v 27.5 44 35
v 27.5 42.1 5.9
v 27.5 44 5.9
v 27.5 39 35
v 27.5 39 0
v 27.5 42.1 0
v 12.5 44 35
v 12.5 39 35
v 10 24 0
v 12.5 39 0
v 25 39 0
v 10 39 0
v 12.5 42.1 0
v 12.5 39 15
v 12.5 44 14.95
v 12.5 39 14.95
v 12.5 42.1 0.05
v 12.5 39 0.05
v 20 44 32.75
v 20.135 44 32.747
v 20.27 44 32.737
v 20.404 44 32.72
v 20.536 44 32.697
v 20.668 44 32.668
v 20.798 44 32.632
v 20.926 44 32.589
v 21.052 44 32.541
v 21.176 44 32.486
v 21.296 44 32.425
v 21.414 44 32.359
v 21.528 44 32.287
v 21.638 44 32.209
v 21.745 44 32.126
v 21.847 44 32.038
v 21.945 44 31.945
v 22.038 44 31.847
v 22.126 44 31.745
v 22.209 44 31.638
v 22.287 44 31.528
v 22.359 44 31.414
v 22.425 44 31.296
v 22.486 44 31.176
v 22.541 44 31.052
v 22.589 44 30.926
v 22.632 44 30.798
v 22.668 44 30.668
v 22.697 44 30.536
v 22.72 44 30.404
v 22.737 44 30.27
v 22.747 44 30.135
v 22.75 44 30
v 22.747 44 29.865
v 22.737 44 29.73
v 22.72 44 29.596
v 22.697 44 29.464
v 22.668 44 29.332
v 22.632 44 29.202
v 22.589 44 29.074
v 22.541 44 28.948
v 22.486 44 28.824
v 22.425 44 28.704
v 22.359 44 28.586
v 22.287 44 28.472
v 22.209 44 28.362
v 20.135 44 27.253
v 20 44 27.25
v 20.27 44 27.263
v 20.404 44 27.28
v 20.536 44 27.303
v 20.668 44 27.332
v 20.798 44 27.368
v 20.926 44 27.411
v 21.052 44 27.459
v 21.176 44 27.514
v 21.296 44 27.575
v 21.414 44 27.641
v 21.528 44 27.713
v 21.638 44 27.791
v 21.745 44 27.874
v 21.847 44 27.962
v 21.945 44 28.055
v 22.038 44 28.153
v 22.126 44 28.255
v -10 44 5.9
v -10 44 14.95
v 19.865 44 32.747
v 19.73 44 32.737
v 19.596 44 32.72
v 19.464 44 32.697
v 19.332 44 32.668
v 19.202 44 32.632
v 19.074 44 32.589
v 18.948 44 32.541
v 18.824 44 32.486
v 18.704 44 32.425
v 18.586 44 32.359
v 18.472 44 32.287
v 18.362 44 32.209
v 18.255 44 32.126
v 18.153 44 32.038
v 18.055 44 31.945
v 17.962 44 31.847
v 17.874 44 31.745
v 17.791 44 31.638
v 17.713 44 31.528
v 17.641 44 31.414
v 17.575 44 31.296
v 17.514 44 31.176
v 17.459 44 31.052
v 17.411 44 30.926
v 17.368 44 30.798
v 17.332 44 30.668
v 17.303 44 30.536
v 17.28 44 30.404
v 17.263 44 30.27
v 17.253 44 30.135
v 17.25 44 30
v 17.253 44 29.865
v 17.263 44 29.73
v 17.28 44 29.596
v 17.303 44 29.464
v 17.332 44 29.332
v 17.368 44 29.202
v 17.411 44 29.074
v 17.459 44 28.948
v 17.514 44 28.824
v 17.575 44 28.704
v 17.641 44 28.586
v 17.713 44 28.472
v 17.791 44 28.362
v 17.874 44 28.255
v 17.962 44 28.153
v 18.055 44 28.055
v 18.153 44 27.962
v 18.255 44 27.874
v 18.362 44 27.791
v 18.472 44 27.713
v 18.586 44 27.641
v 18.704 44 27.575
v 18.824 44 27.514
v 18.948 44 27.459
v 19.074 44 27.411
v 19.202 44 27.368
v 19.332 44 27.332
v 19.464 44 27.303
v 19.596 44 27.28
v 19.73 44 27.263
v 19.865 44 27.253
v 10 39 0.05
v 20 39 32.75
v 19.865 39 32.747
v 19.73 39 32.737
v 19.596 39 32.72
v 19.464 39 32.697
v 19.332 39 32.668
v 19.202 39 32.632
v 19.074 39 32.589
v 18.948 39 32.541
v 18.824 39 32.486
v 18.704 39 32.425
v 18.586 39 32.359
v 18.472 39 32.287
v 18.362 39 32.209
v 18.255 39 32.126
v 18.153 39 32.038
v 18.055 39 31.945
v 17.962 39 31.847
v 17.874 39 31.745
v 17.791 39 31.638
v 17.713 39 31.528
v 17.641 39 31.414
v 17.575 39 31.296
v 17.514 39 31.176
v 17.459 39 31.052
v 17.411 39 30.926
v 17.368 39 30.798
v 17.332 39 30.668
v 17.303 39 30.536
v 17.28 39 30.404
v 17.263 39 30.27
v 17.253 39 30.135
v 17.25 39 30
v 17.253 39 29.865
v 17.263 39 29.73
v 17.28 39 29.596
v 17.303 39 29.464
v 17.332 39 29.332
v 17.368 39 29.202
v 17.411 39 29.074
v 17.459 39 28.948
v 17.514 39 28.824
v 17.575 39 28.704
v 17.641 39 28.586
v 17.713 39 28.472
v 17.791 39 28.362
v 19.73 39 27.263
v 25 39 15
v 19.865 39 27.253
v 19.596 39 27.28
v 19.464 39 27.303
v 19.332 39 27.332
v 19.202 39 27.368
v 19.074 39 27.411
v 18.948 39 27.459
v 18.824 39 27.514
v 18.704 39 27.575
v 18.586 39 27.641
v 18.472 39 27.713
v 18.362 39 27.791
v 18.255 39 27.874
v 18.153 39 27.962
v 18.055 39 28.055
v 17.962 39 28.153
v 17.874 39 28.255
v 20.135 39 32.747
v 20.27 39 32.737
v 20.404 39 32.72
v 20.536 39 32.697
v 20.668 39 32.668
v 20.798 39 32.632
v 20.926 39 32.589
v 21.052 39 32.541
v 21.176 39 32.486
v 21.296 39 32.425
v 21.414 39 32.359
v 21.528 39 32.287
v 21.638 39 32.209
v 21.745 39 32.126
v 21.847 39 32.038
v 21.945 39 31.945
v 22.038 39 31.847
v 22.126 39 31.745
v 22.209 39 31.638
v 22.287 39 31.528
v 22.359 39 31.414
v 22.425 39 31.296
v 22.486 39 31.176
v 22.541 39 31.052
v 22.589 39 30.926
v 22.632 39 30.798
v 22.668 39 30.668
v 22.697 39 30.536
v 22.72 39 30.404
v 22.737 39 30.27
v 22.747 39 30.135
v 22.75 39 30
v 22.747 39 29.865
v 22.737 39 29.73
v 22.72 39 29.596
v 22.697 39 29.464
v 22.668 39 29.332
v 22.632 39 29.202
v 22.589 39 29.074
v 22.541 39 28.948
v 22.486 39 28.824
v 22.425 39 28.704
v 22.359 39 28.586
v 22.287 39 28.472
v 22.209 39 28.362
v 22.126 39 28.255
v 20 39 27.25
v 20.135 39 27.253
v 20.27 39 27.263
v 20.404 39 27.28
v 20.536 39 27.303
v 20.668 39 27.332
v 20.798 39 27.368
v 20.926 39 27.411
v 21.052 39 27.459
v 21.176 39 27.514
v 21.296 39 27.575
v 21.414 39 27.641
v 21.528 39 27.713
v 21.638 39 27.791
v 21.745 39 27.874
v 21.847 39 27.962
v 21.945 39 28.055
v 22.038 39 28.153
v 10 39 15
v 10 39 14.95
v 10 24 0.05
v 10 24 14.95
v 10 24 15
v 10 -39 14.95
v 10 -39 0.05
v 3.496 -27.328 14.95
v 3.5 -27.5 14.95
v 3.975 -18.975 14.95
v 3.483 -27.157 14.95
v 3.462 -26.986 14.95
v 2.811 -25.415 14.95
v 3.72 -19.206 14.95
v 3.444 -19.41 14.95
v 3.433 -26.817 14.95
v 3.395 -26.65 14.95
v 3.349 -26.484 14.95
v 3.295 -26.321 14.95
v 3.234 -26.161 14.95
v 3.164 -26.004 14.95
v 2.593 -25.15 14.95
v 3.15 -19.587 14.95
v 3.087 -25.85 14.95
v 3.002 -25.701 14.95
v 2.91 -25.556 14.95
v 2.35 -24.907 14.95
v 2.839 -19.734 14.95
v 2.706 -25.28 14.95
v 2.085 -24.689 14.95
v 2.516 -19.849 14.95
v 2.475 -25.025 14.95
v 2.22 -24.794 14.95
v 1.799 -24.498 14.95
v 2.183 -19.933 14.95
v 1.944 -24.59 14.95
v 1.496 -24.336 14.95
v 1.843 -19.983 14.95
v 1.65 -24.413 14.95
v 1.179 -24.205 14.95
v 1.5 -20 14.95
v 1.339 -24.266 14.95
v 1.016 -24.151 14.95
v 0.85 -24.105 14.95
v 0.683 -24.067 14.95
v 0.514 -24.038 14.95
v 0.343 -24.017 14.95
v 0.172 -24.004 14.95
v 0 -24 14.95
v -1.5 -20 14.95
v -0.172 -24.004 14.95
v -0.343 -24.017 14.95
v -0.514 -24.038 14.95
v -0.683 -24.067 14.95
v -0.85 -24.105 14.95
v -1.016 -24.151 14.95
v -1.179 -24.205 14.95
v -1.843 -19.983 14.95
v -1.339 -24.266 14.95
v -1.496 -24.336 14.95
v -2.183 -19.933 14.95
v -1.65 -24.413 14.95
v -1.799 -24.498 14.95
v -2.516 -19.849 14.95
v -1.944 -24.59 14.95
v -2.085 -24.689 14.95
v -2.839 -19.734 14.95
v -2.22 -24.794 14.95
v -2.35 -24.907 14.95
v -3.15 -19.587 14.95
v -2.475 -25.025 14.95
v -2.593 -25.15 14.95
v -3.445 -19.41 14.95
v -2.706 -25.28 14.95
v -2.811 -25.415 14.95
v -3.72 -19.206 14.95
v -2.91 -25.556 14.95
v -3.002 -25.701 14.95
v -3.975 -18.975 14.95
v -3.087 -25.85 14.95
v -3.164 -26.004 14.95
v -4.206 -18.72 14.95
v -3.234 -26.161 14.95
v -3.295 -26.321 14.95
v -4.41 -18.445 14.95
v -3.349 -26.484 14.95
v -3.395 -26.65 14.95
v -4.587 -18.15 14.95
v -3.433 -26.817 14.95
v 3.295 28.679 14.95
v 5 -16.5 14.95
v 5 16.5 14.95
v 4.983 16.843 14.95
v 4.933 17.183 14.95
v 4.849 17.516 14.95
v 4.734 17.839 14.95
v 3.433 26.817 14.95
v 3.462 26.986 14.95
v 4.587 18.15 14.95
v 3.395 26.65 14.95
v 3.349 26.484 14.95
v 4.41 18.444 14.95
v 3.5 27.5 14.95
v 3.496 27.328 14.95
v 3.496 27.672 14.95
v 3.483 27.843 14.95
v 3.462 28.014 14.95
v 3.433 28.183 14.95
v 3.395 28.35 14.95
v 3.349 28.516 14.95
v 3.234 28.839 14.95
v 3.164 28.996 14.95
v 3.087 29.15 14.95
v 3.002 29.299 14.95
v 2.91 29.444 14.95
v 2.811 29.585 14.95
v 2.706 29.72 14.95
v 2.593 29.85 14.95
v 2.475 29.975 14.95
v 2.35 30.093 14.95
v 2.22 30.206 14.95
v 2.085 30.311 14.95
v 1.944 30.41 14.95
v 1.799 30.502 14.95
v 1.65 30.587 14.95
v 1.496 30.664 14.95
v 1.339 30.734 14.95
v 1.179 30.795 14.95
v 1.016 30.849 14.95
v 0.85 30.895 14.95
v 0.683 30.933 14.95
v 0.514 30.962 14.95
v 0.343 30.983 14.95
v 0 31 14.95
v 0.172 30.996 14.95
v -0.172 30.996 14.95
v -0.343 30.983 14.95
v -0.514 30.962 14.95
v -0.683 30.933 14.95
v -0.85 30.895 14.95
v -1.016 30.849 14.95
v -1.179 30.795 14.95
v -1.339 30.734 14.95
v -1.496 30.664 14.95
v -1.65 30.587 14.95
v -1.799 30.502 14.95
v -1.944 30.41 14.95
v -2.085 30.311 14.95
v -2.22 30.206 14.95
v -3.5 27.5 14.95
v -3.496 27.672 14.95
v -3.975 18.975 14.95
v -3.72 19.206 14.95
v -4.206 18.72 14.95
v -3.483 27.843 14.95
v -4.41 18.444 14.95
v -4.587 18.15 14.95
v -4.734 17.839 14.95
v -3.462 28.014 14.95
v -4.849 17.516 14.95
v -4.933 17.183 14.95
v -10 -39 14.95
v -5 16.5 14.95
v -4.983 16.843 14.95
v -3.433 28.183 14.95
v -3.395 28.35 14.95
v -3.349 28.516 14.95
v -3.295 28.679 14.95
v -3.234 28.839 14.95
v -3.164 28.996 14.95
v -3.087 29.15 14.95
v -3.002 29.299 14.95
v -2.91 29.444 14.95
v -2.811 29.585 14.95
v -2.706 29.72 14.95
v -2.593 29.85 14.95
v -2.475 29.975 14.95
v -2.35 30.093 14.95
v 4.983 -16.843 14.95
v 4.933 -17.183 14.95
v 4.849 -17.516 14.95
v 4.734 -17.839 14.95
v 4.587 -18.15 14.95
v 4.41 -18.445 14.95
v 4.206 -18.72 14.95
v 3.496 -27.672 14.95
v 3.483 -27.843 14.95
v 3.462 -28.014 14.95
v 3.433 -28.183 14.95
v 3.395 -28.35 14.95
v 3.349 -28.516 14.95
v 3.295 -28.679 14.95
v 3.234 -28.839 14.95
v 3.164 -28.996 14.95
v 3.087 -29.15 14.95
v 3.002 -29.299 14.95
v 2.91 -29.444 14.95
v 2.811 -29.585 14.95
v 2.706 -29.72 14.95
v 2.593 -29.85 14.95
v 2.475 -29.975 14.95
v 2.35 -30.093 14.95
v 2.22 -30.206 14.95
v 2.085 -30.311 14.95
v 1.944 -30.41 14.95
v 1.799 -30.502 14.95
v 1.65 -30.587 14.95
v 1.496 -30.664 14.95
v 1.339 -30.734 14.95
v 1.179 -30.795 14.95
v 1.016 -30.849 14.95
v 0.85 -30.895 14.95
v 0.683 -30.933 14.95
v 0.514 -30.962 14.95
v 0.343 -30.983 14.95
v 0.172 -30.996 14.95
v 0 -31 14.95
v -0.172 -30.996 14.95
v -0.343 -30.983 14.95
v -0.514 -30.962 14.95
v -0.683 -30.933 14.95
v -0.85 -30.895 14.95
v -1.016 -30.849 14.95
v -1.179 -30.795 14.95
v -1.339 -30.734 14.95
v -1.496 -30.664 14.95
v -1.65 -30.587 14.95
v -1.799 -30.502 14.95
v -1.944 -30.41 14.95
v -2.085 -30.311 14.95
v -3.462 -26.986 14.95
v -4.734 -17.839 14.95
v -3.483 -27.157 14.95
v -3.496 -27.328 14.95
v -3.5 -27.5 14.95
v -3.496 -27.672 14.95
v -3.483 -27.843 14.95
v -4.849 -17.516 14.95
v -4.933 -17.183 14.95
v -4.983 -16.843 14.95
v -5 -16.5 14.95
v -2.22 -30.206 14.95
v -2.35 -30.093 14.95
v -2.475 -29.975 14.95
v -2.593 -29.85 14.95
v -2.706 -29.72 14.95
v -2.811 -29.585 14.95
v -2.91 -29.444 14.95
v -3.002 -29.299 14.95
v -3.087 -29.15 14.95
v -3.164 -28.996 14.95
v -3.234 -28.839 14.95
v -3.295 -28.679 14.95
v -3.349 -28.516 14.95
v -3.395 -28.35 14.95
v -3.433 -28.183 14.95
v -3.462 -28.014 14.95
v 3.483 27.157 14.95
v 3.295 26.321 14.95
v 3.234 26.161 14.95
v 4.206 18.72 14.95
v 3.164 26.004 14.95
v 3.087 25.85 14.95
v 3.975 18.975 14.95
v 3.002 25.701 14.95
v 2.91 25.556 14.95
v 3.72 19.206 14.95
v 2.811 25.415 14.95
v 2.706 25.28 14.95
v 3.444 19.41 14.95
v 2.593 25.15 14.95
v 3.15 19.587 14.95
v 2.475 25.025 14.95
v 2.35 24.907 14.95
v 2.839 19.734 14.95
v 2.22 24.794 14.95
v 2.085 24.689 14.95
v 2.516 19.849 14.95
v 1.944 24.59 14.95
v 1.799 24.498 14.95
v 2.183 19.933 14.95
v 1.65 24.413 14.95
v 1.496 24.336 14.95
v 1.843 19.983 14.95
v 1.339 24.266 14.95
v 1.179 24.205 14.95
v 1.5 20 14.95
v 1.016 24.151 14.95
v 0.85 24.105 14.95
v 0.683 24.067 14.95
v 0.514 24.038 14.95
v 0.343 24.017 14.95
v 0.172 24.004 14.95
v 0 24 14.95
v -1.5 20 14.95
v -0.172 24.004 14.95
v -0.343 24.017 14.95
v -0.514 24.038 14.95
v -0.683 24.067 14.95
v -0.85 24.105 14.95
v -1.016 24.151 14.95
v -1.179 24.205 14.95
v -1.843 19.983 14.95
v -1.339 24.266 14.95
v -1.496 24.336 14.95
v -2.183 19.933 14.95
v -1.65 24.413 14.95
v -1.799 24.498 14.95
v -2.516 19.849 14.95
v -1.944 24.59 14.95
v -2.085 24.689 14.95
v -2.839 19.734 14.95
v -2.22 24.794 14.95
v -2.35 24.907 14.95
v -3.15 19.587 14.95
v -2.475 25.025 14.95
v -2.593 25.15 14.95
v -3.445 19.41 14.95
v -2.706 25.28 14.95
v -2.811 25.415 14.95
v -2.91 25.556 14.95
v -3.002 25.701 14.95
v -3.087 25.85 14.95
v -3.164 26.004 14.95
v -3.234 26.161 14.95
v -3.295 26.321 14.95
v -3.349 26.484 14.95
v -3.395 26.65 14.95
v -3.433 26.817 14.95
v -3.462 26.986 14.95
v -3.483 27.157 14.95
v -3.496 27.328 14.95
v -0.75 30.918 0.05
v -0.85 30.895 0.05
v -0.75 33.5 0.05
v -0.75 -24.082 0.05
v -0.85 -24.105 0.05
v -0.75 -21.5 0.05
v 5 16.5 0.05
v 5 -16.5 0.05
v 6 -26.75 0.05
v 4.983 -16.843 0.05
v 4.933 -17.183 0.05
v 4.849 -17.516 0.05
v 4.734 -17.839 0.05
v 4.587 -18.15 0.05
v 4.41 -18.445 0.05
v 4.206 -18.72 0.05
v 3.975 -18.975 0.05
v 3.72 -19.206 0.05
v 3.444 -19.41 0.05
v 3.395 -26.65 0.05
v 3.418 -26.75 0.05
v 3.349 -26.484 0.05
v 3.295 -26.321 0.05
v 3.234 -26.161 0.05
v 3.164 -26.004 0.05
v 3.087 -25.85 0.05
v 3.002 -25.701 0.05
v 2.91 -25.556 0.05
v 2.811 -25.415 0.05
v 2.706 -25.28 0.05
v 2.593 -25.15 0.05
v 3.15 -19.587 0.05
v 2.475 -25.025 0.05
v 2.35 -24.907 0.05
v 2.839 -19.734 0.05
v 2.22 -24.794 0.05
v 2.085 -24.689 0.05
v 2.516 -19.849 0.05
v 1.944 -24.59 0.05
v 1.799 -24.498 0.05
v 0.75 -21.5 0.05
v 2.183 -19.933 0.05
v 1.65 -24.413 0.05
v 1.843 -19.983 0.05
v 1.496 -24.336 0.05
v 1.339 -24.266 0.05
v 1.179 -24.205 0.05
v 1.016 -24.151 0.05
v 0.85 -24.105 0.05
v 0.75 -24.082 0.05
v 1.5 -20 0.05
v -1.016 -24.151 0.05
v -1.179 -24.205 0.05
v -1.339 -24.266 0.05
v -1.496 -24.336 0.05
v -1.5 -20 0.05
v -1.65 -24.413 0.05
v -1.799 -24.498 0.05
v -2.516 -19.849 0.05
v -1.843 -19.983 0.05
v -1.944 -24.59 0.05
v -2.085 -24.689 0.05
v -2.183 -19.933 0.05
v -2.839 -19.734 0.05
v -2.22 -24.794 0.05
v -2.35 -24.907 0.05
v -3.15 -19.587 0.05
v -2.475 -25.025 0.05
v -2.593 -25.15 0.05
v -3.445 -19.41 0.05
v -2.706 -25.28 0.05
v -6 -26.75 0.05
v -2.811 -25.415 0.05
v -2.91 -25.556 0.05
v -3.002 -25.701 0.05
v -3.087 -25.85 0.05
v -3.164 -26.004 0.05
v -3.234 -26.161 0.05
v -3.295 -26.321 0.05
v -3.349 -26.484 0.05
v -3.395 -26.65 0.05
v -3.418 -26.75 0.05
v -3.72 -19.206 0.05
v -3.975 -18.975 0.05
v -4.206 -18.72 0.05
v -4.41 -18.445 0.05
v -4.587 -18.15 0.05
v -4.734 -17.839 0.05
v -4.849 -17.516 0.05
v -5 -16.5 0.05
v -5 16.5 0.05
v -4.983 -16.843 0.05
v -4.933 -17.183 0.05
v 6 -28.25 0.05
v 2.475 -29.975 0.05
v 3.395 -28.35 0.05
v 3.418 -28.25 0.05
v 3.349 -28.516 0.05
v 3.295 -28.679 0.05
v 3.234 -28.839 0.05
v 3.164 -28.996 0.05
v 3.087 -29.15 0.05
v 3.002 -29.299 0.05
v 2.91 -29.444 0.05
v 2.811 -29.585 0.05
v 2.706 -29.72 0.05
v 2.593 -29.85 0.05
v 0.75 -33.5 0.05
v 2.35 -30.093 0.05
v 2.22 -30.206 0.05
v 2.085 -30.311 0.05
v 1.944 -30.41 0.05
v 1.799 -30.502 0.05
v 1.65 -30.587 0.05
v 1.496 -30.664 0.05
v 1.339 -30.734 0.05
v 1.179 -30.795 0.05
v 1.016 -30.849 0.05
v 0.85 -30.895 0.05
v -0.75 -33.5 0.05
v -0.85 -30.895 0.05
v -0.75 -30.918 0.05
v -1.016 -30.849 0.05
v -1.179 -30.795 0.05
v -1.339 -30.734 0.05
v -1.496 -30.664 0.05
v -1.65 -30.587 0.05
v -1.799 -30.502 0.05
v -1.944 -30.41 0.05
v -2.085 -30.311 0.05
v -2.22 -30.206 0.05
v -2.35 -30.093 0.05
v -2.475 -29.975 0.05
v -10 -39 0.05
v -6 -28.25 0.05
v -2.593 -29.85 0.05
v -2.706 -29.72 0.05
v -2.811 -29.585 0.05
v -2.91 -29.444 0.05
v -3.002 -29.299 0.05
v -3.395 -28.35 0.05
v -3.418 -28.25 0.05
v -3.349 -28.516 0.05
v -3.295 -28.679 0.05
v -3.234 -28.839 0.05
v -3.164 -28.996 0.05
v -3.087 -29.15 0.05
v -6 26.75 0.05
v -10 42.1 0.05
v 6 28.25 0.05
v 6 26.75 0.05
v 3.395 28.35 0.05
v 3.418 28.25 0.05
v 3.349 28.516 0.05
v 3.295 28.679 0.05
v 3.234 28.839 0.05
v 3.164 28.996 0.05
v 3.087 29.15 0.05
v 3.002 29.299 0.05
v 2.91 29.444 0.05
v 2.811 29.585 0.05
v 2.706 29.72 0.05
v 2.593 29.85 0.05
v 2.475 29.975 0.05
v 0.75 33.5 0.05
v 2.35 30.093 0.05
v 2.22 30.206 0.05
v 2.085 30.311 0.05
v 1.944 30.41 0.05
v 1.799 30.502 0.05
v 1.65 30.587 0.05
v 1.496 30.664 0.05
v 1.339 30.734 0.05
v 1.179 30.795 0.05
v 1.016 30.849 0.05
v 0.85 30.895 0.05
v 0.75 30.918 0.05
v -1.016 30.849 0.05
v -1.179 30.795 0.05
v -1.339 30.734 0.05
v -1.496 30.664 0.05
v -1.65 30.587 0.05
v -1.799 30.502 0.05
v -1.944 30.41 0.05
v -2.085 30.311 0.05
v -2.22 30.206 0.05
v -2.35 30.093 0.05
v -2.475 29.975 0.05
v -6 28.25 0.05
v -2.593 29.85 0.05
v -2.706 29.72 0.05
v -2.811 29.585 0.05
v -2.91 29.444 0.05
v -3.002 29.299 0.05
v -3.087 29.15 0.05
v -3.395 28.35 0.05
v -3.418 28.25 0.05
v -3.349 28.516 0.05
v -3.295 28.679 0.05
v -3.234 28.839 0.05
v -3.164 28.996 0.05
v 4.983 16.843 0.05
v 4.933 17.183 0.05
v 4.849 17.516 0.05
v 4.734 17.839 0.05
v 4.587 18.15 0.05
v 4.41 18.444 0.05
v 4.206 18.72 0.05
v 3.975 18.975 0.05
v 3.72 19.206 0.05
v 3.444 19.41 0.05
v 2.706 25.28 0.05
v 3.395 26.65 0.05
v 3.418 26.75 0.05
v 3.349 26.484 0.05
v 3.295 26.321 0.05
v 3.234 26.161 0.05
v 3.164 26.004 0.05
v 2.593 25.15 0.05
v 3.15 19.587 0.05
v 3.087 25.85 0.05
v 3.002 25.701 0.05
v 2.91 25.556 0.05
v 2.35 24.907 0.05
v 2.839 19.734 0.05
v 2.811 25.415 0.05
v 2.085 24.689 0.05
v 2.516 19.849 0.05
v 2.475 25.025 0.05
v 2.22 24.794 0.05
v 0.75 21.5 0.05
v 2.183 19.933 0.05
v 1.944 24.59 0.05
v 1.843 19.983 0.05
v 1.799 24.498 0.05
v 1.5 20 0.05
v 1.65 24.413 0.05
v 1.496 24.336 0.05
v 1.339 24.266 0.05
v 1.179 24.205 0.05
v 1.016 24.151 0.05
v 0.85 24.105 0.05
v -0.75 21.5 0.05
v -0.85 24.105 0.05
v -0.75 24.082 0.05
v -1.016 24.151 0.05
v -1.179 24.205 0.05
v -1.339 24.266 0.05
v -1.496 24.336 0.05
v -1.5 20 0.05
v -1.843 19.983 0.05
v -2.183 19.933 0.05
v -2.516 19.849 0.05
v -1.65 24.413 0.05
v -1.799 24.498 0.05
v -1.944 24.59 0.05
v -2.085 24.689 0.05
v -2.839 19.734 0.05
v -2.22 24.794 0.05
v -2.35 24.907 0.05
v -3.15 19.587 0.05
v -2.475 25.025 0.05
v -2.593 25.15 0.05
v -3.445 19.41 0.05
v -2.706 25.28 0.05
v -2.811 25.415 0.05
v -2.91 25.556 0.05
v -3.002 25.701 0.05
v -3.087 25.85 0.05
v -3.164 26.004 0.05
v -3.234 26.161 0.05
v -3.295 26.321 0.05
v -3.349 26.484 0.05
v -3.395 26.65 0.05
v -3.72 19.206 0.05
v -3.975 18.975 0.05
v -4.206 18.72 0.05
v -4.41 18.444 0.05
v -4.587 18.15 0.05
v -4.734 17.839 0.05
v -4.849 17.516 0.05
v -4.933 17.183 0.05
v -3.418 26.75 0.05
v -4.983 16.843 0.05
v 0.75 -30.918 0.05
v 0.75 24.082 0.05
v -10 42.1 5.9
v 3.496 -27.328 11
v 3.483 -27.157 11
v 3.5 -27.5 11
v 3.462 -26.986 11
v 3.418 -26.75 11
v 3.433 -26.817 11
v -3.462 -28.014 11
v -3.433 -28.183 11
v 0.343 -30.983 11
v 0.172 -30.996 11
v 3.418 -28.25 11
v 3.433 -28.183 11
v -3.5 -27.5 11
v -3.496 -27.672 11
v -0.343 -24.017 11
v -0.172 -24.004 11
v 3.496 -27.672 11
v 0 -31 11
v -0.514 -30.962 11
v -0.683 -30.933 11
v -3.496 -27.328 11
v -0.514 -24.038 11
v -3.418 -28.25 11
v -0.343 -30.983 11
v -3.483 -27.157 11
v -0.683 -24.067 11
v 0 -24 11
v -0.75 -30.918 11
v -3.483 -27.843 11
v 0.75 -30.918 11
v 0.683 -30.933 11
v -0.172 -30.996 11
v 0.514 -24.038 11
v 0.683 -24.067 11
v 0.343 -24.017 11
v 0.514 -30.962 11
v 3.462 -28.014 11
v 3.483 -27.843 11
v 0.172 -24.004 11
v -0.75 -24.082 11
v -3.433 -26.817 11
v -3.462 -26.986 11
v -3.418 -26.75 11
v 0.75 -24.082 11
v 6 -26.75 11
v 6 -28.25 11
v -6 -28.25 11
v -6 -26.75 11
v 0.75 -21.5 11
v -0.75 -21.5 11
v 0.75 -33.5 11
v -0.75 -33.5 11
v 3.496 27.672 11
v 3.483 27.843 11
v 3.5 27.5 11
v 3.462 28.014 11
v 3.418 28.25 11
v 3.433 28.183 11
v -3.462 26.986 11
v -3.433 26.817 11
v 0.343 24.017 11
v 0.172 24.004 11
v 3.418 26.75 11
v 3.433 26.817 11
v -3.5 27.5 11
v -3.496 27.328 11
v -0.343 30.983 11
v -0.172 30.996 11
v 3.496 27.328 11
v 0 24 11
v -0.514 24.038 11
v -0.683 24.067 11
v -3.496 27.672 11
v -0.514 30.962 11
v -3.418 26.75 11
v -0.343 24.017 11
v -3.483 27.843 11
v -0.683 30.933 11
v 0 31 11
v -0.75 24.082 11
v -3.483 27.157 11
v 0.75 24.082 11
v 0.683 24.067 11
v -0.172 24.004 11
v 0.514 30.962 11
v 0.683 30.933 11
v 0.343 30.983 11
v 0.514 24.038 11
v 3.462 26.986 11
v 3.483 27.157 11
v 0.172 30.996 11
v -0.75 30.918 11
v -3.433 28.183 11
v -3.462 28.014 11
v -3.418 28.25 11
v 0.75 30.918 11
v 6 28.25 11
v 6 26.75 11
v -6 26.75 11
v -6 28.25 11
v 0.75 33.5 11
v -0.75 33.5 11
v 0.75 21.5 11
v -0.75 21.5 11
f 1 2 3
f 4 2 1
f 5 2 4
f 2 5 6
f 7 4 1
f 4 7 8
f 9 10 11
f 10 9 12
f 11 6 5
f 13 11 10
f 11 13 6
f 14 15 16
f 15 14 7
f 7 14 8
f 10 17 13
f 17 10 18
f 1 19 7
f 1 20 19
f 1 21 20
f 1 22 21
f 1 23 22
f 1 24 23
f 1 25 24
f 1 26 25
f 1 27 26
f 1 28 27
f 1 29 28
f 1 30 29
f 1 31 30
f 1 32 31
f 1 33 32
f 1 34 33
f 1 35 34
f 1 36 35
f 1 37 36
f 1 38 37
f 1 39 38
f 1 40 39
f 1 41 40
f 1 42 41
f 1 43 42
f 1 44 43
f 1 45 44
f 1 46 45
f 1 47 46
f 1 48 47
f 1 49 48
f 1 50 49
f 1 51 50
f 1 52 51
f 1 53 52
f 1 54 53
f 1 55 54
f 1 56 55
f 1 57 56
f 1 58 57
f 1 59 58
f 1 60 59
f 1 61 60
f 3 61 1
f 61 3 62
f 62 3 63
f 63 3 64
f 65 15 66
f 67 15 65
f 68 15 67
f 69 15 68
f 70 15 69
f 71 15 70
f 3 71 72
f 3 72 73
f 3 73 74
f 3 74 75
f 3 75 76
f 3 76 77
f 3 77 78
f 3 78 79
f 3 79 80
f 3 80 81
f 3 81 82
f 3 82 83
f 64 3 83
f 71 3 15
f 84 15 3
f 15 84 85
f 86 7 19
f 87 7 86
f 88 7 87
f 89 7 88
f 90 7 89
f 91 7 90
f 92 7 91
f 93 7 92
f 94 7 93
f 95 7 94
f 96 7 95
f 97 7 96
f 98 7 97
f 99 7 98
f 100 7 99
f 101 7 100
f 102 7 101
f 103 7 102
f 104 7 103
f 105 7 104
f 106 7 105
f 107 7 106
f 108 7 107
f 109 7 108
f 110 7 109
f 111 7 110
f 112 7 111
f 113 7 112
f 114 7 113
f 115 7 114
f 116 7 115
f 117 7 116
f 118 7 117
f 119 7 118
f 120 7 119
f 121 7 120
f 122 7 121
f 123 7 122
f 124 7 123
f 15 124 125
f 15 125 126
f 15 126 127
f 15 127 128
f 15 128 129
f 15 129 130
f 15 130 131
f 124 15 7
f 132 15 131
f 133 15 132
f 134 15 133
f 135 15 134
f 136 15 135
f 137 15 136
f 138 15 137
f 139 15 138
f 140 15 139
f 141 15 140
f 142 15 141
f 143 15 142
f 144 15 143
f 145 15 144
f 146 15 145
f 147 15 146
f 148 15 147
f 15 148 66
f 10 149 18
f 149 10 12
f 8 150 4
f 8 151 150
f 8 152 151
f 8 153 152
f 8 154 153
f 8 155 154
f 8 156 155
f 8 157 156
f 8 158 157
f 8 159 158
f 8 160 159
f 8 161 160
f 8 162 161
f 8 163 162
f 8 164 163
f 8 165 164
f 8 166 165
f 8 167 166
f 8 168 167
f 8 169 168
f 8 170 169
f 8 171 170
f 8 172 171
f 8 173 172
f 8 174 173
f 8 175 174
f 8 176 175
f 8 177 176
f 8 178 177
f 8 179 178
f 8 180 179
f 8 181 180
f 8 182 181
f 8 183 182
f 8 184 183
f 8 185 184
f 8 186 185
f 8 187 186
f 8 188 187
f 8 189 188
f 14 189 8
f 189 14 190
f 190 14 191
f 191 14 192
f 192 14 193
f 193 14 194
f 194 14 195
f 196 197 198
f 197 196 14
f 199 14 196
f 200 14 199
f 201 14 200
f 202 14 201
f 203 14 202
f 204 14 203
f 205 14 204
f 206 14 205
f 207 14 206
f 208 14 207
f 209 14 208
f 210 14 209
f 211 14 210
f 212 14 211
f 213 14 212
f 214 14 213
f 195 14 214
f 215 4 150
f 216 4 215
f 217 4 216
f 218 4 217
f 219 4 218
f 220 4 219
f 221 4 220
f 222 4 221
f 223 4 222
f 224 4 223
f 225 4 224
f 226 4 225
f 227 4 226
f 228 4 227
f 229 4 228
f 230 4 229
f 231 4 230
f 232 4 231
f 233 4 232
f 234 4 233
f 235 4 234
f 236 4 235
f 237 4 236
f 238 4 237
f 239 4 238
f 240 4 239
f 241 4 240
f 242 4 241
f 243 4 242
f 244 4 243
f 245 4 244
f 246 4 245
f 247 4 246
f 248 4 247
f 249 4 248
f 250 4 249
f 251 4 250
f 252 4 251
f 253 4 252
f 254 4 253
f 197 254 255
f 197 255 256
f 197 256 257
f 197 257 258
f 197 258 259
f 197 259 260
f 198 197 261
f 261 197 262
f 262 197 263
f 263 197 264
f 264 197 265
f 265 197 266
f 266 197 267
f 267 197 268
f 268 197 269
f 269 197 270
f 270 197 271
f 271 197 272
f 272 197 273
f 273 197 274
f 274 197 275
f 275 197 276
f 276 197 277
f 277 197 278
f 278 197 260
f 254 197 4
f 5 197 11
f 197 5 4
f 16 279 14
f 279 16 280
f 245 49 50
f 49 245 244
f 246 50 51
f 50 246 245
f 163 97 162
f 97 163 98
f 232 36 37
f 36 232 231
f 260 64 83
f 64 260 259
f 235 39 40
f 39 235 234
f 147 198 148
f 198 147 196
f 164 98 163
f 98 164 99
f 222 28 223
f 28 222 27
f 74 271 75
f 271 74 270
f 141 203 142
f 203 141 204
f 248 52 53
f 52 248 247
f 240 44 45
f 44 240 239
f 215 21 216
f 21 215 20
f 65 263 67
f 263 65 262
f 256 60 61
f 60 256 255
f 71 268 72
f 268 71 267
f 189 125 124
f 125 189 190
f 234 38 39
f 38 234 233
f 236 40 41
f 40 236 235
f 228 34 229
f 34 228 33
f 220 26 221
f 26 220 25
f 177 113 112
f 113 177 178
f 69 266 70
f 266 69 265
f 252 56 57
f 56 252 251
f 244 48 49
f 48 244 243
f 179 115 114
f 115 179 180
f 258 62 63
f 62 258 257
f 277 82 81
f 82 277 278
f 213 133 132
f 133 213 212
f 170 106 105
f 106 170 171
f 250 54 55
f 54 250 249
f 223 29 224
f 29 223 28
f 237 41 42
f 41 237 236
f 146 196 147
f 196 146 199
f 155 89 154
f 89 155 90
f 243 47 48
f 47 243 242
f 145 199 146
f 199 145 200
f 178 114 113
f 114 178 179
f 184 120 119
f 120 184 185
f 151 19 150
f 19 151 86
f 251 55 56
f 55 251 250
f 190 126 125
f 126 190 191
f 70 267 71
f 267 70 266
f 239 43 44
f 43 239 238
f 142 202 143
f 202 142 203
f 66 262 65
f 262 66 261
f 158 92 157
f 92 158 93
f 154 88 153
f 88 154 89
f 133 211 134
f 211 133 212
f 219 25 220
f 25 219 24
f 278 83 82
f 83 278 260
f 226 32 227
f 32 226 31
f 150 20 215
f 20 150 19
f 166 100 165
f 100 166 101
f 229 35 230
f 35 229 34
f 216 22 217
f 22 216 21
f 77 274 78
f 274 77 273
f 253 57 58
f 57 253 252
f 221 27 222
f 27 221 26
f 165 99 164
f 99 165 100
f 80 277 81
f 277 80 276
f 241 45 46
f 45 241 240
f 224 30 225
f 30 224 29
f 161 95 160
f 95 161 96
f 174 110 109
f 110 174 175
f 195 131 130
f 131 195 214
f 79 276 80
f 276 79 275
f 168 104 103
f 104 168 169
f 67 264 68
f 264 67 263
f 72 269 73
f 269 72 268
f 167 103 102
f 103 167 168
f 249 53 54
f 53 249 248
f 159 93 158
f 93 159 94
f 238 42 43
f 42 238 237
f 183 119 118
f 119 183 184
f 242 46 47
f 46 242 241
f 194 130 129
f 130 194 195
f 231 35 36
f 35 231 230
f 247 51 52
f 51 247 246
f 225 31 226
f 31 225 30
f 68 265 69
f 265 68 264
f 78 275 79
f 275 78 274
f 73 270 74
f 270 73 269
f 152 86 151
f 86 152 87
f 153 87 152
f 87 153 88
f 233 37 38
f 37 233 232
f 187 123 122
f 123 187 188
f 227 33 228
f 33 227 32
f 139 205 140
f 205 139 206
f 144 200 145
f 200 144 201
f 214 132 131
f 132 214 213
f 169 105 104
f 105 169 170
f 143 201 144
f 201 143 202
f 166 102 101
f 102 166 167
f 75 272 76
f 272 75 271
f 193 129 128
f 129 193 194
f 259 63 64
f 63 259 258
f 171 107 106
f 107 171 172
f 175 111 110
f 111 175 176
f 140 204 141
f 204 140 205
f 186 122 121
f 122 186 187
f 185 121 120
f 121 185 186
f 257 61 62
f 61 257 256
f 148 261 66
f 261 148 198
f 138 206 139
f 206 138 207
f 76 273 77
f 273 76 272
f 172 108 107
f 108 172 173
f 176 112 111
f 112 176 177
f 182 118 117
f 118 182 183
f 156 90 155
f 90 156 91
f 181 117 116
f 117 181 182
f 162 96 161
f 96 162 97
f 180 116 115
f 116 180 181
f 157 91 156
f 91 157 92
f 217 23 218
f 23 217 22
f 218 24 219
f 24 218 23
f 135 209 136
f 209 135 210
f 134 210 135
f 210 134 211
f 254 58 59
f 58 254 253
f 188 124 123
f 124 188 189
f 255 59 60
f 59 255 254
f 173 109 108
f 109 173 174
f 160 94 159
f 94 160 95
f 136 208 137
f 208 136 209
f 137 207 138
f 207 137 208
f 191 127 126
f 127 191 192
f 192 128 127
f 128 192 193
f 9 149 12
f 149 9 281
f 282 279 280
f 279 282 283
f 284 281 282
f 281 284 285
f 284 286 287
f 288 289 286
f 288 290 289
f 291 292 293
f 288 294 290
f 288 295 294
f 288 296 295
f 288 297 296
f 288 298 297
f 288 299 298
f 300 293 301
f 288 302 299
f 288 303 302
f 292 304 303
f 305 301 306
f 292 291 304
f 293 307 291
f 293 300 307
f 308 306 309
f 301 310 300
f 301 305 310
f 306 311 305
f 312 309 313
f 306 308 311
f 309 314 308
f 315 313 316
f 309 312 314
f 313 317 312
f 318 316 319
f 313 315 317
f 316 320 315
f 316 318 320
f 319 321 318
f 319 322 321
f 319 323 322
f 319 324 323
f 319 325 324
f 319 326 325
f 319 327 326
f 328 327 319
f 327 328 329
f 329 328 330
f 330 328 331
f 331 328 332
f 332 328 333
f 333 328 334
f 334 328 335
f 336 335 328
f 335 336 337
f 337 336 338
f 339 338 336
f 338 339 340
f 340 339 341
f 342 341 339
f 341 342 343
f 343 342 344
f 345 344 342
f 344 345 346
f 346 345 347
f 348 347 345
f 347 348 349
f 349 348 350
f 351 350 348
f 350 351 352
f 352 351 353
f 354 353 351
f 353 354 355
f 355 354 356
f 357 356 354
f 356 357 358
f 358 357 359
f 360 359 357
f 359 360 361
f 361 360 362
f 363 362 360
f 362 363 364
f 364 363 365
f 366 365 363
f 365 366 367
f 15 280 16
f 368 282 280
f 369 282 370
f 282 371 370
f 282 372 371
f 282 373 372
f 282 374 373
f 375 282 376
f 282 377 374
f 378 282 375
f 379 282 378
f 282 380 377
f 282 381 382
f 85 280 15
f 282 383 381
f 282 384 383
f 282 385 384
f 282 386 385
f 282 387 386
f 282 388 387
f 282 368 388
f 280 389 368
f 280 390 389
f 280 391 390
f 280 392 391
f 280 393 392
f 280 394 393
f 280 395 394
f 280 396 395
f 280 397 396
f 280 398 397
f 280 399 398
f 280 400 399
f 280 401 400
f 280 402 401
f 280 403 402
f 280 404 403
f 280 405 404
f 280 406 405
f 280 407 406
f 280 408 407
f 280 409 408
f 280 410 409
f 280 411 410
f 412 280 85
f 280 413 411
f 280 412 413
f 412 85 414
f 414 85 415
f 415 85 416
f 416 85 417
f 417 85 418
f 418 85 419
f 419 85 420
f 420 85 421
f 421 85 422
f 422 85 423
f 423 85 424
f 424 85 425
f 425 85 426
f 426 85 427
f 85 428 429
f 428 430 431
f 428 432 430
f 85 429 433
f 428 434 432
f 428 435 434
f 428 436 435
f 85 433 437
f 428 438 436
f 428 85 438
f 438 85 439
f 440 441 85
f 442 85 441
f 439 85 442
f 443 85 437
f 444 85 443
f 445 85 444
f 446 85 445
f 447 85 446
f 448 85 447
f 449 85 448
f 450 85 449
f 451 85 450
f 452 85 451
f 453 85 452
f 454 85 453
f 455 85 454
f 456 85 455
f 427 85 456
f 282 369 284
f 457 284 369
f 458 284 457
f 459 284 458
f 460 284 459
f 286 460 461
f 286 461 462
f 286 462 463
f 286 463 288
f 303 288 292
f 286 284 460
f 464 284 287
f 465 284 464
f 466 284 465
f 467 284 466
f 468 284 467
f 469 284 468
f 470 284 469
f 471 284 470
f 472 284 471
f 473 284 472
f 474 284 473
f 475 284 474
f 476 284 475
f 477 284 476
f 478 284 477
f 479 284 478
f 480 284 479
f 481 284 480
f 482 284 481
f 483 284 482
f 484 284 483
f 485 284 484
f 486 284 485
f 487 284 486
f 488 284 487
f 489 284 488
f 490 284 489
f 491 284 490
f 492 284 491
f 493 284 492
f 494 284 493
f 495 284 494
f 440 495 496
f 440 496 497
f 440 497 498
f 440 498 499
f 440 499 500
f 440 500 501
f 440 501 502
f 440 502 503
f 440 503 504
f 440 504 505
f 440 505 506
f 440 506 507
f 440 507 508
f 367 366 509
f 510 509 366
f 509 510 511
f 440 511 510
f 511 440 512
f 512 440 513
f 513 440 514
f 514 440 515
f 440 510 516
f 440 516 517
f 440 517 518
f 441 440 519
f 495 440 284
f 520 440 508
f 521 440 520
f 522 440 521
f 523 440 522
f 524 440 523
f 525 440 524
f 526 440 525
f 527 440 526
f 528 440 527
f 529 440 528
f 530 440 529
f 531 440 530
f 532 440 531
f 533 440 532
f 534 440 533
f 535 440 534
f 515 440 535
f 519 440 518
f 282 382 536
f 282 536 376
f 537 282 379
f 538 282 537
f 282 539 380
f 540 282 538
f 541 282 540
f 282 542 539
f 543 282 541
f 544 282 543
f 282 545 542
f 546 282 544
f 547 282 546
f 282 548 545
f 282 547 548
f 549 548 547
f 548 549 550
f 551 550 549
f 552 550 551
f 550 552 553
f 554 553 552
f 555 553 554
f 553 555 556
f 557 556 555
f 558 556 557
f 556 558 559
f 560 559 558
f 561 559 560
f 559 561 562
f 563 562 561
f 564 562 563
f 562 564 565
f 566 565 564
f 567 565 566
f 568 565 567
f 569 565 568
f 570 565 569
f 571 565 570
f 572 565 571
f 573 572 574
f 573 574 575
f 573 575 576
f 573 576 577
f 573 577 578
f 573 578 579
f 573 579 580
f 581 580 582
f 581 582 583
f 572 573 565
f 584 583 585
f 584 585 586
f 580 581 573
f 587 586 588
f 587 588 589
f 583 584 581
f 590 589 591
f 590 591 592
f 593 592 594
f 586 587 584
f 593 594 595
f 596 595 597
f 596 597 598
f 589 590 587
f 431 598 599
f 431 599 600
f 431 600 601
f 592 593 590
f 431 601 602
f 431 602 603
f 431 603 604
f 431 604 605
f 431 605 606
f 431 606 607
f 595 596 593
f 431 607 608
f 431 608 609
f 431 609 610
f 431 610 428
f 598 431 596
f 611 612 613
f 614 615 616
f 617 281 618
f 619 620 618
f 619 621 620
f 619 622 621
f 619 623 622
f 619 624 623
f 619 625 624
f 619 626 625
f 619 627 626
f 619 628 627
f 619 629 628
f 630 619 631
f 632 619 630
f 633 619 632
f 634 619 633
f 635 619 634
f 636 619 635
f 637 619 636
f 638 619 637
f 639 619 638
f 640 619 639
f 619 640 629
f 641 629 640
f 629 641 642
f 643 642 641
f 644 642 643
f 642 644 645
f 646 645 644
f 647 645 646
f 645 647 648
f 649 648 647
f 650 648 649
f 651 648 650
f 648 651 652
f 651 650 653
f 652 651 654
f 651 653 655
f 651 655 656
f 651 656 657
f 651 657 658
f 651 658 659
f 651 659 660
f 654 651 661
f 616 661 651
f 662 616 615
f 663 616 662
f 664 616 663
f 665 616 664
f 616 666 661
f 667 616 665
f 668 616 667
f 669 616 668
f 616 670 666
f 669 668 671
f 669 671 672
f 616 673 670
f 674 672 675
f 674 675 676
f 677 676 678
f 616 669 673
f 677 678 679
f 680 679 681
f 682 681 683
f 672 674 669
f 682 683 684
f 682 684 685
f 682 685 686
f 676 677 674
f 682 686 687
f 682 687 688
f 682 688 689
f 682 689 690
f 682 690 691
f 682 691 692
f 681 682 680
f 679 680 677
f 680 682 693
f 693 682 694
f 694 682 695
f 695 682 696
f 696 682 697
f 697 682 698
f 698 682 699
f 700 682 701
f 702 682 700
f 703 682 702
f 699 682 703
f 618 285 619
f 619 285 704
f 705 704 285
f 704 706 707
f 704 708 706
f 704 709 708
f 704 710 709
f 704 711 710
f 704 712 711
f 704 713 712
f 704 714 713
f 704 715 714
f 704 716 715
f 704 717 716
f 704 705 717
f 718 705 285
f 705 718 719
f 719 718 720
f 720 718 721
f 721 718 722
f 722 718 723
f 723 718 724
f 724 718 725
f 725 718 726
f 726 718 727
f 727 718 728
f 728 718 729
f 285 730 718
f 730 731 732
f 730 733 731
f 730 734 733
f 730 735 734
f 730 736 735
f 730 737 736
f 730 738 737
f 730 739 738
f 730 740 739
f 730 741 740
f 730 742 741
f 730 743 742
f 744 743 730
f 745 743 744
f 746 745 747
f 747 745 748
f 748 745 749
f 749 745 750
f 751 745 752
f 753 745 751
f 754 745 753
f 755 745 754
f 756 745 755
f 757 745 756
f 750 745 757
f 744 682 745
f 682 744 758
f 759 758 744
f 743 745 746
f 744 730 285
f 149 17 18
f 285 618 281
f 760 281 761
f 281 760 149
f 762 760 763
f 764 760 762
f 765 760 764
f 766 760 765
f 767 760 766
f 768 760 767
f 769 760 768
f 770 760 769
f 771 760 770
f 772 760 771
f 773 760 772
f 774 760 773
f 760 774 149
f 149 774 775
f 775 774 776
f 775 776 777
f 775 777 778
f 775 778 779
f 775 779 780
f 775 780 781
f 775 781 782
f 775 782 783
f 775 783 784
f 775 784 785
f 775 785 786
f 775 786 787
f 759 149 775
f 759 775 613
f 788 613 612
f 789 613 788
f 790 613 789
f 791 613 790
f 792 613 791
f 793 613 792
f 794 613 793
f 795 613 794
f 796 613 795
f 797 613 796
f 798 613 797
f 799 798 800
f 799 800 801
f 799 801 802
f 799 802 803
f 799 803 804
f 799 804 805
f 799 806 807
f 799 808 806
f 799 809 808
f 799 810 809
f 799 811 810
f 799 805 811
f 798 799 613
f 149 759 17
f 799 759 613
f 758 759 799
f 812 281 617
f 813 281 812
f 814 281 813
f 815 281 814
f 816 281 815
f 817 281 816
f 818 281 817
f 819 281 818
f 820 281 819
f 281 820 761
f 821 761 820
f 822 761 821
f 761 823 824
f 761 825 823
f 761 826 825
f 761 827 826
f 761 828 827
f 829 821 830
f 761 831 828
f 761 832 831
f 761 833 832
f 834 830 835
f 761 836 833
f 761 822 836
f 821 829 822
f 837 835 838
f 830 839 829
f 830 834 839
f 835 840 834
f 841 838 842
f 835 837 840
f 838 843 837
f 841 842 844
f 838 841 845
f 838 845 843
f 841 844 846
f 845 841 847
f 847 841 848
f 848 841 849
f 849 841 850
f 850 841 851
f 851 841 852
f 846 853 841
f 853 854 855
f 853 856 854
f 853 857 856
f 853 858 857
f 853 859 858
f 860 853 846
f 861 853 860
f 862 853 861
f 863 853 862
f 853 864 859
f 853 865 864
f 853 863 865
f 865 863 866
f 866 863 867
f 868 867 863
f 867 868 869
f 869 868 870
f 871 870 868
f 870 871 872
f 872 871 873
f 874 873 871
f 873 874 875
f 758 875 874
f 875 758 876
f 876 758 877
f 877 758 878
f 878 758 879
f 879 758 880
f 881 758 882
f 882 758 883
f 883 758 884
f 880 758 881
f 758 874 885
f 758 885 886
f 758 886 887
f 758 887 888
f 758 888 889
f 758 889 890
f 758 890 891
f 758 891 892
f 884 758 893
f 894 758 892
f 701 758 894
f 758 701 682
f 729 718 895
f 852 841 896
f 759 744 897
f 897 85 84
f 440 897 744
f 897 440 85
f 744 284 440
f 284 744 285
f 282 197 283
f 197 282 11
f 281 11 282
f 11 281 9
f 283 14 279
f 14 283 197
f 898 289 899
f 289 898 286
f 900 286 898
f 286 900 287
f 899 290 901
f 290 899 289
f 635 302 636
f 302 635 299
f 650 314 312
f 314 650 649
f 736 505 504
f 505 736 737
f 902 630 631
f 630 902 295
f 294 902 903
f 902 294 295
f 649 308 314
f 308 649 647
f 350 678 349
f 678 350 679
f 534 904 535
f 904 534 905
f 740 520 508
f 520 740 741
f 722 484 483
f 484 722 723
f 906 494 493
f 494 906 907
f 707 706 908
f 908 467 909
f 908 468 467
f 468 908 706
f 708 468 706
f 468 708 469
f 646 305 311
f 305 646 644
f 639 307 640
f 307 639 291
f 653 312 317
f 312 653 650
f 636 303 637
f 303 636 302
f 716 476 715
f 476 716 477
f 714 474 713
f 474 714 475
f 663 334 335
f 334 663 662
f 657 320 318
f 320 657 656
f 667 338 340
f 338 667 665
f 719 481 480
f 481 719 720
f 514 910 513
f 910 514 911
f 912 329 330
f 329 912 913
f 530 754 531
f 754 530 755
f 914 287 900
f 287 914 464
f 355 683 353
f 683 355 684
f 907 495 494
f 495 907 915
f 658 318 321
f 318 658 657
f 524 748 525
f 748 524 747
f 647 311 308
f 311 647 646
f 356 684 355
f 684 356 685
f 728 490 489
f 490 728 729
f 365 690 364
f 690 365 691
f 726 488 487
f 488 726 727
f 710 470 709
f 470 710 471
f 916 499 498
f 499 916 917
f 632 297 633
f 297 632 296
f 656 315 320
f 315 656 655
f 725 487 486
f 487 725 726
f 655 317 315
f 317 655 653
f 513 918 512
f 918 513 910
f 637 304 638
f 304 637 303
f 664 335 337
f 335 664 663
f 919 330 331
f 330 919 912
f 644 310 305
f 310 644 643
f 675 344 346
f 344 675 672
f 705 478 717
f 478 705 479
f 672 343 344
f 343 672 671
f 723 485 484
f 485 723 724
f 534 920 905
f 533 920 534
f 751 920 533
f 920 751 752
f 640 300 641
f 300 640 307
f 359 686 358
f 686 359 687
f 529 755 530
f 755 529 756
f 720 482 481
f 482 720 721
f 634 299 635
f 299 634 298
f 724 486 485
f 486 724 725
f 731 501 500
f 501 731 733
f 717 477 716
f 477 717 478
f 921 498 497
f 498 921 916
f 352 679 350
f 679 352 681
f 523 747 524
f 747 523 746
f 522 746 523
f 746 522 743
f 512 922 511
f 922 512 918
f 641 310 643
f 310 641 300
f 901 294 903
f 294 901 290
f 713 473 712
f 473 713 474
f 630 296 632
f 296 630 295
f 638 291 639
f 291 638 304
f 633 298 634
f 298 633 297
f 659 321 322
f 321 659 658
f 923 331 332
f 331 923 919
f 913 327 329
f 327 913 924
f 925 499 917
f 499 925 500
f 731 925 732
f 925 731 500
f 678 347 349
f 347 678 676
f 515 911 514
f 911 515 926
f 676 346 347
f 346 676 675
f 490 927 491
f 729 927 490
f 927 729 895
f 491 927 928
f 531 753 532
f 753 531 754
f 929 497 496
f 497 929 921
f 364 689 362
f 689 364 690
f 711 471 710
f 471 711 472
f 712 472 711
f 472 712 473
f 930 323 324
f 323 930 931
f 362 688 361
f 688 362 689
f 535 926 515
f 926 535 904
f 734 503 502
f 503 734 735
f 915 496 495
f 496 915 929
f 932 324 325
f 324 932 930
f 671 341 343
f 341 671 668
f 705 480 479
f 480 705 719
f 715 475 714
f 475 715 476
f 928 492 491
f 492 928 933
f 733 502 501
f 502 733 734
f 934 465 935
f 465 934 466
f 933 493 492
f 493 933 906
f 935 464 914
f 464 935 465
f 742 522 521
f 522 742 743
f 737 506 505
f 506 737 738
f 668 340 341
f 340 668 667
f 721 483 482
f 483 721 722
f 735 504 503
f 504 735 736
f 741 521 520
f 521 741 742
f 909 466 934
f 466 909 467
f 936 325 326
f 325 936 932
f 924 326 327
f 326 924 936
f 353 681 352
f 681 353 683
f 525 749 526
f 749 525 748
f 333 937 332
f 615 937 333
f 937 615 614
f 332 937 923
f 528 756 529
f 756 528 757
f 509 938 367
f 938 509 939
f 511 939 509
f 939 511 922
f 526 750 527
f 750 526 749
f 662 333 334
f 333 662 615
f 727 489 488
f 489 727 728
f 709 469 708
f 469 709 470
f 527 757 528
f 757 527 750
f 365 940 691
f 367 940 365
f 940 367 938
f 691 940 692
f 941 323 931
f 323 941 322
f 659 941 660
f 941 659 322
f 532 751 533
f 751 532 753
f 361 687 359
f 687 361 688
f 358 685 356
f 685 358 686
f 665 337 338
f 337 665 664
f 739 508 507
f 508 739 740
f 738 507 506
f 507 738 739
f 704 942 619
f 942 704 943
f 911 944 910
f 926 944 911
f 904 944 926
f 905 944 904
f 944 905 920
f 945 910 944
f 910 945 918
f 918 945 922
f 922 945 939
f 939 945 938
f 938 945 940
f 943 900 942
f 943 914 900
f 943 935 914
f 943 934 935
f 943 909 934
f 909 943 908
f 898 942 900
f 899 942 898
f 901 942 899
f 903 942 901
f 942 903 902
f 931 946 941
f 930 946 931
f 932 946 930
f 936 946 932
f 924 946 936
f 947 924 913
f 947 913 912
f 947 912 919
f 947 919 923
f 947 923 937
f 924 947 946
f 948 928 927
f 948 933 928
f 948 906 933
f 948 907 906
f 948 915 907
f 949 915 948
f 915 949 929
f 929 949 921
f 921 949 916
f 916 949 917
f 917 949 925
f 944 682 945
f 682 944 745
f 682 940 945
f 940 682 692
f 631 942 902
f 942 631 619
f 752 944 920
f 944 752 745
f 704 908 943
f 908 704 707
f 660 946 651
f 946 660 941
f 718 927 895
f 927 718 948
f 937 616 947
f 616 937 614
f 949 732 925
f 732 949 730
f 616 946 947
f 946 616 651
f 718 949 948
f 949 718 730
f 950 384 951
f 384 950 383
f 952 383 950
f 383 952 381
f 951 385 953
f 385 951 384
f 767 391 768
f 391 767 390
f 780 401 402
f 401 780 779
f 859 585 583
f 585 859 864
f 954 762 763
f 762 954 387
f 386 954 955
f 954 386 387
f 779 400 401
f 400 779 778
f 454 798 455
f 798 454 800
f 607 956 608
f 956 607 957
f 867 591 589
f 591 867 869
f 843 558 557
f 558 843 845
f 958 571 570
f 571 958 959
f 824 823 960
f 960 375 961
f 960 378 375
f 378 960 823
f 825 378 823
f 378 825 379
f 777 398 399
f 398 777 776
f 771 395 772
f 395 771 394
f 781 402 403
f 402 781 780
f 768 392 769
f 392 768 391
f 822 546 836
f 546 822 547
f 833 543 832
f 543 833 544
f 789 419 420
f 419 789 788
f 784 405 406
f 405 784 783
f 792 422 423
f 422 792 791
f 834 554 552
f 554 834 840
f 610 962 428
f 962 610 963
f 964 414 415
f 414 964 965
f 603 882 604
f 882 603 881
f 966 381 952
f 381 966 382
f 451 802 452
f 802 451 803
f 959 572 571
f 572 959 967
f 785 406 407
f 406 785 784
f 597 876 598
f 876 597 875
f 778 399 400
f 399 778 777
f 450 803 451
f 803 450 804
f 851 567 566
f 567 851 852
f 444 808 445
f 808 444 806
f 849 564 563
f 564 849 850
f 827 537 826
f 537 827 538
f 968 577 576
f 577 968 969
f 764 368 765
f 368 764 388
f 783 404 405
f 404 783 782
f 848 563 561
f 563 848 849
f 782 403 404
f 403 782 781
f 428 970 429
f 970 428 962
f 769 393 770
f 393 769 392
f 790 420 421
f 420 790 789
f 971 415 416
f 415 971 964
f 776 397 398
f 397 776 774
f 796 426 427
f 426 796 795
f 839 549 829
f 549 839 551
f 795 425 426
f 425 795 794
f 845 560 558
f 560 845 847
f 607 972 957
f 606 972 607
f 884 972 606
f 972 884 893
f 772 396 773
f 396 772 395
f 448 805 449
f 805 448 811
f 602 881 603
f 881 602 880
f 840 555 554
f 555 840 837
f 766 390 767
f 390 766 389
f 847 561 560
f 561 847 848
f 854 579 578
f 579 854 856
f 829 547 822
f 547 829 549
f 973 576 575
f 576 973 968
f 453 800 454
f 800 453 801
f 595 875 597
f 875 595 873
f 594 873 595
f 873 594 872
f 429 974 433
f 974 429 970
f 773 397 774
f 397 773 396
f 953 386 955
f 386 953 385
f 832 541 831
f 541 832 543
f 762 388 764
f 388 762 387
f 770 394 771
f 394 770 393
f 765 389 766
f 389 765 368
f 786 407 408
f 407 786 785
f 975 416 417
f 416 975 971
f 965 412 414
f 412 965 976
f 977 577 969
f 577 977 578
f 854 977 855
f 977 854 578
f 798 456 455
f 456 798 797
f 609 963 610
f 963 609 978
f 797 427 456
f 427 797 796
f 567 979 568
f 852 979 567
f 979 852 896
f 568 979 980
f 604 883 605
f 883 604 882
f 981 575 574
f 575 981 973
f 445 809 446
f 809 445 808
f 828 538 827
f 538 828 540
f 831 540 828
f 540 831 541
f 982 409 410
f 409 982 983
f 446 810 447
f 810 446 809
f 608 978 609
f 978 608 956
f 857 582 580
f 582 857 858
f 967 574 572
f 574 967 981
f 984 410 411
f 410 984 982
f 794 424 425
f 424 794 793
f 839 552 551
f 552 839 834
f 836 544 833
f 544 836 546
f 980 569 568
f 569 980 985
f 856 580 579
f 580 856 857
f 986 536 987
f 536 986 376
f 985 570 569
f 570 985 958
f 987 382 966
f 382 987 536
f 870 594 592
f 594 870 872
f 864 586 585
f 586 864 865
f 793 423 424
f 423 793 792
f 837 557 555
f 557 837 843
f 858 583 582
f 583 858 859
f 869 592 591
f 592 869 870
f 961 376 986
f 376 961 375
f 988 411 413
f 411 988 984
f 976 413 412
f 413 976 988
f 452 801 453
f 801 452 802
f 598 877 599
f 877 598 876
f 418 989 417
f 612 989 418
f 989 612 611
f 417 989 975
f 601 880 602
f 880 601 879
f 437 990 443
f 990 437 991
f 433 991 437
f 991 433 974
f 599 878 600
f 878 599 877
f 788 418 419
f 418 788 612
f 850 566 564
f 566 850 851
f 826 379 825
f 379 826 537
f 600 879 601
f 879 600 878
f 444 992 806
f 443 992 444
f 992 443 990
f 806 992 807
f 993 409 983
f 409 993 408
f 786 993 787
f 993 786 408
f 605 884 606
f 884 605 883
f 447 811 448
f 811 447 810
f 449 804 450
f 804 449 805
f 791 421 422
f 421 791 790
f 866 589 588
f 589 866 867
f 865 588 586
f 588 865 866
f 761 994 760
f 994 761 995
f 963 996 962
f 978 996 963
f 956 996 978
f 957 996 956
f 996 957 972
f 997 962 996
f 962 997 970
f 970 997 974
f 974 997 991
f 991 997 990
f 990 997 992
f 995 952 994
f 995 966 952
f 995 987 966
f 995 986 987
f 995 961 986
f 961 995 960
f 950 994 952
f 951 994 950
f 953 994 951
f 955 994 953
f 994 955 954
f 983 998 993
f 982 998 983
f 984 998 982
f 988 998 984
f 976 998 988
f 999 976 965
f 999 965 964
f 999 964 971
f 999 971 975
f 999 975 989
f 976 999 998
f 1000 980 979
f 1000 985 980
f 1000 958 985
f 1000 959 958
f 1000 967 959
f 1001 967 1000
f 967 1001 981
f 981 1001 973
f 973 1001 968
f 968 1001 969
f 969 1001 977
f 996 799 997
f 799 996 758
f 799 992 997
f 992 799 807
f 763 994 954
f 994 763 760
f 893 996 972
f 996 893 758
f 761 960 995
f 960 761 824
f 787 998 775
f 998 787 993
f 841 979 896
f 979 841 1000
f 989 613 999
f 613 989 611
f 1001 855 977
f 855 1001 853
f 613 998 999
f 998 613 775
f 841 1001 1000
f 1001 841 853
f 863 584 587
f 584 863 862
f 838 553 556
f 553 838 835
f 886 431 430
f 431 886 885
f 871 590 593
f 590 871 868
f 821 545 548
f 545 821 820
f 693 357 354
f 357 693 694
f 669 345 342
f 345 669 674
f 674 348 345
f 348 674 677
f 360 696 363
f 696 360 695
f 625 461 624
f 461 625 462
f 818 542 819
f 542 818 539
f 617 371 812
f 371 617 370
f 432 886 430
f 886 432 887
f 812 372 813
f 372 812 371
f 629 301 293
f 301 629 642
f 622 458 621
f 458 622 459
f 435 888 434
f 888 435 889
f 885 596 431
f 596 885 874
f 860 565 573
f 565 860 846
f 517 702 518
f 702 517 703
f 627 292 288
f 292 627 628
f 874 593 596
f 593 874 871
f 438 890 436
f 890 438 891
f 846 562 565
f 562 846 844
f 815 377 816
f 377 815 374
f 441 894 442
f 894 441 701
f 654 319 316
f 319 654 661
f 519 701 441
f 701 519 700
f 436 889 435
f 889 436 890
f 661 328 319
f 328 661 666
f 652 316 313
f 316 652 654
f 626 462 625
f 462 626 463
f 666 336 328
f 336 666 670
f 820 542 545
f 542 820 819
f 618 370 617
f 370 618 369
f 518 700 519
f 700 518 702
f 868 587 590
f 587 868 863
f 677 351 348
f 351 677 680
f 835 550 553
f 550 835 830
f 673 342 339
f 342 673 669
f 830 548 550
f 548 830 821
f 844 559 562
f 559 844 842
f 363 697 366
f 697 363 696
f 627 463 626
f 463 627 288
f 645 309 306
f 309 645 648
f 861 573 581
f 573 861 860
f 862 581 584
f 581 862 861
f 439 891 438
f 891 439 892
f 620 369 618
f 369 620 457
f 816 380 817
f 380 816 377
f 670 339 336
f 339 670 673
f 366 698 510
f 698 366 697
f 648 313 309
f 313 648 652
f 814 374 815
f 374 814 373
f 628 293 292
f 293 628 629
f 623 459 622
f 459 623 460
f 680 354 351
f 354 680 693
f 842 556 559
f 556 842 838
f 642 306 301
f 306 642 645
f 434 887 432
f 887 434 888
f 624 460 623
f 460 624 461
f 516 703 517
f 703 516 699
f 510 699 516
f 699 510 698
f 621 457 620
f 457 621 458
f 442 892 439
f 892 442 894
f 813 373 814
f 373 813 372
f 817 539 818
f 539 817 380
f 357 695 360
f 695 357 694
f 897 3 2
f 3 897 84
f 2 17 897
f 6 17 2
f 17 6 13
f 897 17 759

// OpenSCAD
use <./utils.scad>;
$fn=128;
e = 0.1;


// measurements
d1 = 7; // screw post diameter
d2 = 12; // "diameter" of bottom fins of screw post
h1 = 15; // height of screw post


x1 = 20; // vertical distance between screw post and center of hinge mount
x2 = 18; // left-right distance between screw post and plastic wall


module screw_post() {
    ww = 1.5;
    cylinder(d=d1, h=h1);
    translate([-d2/2, -ww/2, 0]) cube([d2, ww, 11]);
    translate([-ww/2, -d2/2, 0]) cube([ww, d2, 11]);
}

// rough parameters
W1l = 39;        // half-width of screw-post mount, left side
W1r = 44;        // half-width of screw-post mount, right side (not symmetric)
W1 = W1l + W1r;  // width of screw-post mount
H1 = 20;         // height of screw post mount
W2 = 5;         // width of connector segment
H2 = 27.5;         // height of connector segment

H3 = 15;         // height of hinge segment

// precision parameters
dx = x1 - H3/2; // x offset of hinge part to get correct vertical spacing


module screw_post_fit_test() {
    difference() {
        cylinder(d=20, h=2);
        translate([0, 0, -0.5]) screw_post();
    }    
}

// screw_post_fit_test();

module screw_posts_fit_test() {
    difference() {
        translate([-H1/2, -W1l, e/2]) cube([H1, W1, 1]);
        translate([0, -55/2, 0]) screw_post();
        translate([0, 55/2, 0]) screw_post();
    }    
}

// screw_posts_fit_test();

module fixer() {
    difference() {
        union() {
            translate([-H1/2, -W1l, e/2]) cube([H1, W1, h1 - e]); // screw post mount
            translate([0, W1r-W2, e/2]) cube([H2, W2, h1 - e]); // connector part
            
            // hinge part (hole included)
            translate([dx, W1r - 5, 0])
            difference() {
                cube([H3, 5, 35]);
                #translate([H3/2, 7, 30]) rotate([90, 0, 0]) cylinder(d=5.5, h=10);
            }
            
            // corner brace 1 (better geometry but interferes with circuit board)
            /*
            translate([12.5, W1r-W2, 14.5])
             rotate([-90, 0, 0])
              linear_extrude(W2)
               polygon([[0, 0], [0, -20], [-20, 0]]);
            */
            
            // corner brace 2
            translate([H1/2, W1r-W2, 0]) linear_extrude(h1) polygon([[0, 0], [15, 0], [0, -15]]);
        }
        
        // material removal
        translate([-5, -20, 0]) rounded_square3([10, 40], r=d1/2, h=16);
        // screw post holes
        translate([0, -55/2, 0]) screw_post();
        translate([0, 55/2, 0]) screw_post();
        translate([-15+e, W1r-2+e, -e]) cube([50, 2, 6]);
    }
}

fixer();
